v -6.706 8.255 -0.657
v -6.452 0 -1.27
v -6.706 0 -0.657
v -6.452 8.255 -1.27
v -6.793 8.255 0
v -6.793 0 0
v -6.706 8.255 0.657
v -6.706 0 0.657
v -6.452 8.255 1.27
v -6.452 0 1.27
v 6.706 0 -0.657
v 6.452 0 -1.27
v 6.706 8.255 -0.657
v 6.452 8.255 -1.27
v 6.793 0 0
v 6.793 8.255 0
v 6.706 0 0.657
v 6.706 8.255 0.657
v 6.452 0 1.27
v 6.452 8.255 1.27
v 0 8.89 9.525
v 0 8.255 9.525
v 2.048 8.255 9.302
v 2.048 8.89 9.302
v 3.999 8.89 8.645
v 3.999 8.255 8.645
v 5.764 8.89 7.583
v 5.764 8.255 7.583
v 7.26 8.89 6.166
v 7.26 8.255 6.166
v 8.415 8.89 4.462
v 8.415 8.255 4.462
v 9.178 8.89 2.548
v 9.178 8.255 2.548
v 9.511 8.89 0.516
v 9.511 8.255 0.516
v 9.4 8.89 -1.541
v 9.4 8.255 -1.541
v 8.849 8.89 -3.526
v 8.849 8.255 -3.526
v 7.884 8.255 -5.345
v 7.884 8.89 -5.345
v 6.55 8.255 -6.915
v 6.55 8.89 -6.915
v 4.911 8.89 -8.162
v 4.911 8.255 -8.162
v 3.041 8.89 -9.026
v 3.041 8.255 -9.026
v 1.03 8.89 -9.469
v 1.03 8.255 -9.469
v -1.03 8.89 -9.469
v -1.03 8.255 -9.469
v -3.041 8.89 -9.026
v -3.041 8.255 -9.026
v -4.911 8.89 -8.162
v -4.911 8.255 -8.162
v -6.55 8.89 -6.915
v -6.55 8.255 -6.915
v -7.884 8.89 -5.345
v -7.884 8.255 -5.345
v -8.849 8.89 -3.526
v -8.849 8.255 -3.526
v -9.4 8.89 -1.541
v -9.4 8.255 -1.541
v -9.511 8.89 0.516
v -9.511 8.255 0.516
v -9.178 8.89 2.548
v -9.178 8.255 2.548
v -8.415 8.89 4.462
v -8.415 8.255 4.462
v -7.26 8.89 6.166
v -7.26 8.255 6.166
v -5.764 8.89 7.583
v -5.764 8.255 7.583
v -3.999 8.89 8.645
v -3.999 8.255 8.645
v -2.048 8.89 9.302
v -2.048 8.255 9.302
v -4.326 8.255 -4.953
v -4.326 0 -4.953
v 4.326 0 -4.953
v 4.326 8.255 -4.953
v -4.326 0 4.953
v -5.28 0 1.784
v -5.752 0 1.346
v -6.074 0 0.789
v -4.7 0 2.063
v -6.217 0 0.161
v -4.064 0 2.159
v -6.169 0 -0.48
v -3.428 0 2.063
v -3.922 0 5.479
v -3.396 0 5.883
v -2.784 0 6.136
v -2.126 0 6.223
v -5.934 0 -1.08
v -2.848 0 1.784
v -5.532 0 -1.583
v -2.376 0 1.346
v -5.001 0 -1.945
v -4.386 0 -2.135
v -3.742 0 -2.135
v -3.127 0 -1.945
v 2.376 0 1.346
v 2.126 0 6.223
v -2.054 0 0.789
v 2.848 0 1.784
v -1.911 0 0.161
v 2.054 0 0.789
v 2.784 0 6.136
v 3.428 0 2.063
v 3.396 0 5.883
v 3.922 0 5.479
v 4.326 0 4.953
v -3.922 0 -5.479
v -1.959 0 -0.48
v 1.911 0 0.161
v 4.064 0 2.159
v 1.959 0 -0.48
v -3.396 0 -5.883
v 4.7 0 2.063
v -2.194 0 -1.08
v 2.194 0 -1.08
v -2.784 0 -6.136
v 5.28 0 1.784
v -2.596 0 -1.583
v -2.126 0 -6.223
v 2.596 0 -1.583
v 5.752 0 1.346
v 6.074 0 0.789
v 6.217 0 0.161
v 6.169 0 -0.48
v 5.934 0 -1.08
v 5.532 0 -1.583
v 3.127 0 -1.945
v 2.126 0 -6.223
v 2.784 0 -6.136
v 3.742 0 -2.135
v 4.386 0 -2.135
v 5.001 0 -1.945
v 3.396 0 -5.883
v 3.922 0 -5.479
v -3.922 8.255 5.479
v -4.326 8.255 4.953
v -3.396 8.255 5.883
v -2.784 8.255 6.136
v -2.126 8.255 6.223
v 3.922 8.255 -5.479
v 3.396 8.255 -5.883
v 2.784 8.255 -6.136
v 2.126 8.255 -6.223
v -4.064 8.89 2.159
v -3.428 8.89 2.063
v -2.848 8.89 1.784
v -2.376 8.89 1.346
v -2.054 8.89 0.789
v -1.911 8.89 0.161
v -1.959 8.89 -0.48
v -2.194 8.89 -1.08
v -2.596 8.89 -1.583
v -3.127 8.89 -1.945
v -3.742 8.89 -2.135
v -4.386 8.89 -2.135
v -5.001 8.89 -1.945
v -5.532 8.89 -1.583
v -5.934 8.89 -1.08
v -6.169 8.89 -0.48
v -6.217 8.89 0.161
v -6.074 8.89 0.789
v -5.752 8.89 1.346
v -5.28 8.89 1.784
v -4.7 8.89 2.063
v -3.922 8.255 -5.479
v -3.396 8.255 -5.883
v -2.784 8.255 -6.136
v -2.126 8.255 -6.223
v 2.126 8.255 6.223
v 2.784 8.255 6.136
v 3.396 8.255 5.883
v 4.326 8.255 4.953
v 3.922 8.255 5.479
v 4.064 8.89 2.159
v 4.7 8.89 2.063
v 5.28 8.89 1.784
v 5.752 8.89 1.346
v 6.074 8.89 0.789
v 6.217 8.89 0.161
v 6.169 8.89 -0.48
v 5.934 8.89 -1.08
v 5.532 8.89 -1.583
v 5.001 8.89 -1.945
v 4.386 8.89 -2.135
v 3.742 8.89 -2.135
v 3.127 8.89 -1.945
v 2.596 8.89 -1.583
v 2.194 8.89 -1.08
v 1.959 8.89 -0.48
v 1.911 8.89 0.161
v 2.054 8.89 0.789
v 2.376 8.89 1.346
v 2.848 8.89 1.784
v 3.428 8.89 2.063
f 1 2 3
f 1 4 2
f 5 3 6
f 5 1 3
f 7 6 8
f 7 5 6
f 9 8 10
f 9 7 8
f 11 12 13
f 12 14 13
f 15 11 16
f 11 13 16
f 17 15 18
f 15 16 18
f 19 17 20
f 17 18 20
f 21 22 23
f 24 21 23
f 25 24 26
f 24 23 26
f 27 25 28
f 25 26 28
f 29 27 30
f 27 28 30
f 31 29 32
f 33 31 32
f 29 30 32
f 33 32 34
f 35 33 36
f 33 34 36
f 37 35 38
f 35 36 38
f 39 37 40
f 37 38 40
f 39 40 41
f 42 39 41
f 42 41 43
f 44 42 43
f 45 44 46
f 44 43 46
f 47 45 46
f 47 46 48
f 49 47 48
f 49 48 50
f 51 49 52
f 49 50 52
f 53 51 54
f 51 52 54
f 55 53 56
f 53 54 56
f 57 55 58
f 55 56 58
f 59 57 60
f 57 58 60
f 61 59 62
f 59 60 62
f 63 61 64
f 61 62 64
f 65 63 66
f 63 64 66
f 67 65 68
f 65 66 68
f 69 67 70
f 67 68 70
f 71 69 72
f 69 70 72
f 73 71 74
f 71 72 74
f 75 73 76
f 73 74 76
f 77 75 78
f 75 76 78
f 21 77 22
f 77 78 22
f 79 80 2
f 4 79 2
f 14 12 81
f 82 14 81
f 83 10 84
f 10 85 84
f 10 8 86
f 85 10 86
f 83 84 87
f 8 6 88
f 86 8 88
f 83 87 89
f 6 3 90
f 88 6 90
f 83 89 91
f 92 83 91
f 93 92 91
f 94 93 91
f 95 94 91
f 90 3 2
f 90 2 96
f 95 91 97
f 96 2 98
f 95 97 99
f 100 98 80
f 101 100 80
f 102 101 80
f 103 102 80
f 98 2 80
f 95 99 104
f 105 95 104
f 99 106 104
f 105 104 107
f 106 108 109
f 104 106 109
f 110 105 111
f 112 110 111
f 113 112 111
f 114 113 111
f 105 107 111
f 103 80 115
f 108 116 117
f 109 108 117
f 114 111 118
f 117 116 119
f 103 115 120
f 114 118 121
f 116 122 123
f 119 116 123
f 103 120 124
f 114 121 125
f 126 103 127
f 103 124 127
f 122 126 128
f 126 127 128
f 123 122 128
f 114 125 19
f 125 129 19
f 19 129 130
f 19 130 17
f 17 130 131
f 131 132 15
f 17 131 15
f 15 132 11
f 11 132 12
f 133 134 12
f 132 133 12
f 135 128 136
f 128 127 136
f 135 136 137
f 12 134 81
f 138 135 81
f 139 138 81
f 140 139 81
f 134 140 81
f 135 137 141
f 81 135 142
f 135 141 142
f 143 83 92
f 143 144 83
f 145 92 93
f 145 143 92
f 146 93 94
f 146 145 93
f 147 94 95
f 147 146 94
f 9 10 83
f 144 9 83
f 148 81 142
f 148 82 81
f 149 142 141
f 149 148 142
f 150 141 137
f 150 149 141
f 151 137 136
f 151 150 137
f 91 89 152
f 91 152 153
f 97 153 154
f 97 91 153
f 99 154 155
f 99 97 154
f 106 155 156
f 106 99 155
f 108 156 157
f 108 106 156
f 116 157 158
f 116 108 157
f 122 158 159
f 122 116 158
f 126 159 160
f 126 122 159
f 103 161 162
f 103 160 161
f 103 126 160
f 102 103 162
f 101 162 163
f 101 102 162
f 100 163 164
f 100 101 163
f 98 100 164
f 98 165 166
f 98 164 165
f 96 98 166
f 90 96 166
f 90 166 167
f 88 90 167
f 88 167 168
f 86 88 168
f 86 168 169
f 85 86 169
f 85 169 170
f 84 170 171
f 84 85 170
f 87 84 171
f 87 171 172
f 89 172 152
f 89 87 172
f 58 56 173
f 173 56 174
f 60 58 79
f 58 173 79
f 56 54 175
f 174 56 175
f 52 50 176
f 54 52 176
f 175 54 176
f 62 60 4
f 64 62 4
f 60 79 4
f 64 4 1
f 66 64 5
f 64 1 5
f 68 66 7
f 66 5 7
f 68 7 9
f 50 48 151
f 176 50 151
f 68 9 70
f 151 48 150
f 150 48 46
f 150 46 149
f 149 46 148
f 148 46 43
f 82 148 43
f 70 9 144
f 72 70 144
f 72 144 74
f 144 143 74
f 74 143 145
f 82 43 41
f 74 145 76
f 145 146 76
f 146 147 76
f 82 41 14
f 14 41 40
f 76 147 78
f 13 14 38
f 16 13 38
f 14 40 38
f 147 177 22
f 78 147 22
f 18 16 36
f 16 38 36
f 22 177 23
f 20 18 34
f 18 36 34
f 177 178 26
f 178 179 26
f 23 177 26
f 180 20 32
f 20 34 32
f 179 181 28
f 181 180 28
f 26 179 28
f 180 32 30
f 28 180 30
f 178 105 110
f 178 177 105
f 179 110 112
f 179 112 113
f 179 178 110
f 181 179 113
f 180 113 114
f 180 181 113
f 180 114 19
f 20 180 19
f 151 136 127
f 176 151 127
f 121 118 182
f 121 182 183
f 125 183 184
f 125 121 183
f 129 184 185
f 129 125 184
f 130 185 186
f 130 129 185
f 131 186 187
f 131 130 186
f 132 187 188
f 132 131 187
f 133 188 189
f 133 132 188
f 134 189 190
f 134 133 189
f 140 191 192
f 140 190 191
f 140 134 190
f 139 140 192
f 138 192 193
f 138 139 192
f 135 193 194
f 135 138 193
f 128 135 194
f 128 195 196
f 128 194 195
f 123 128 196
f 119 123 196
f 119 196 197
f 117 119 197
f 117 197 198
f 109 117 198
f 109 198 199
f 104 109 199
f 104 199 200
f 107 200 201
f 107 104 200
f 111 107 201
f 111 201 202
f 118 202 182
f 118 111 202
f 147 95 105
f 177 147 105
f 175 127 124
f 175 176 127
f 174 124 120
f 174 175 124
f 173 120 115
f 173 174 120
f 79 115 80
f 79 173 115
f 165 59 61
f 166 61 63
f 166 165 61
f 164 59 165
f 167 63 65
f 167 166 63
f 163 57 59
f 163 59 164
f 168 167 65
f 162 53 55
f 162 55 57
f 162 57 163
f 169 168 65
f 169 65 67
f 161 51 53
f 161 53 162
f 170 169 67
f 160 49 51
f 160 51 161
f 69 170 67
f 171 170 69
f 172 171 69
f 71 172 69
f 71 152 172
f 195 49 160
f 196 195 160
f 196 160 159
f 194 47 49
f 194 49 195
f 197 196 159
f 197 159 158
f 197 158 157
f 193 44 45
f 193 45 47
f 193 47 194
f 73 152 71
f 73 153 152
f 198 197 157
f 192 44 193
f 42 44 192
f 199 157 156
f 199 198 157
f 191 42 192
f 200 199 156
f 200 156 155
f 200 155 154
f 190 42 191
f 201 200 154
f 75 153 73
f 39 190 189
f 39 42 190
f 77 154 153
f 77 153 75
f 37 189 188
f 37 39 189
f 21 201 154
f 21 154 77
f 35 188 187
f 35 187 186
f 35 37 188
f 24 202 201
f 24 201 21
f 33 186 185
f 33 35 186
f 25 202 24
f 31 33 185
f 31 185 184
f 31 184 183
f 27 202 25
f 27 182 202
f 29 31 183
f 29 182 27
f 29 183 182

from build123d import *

# Parameters (mm, degrees)
BOSS_EXTRUDE1_DEPTH     = 8.255
SKETCH2_R               = 9.525
BOSS_EXTRUDE2_DEPTH     = 0.635
CUT_EXTRUDE1_DEPTH      = 17.139496584
CUT_EXTRUDE1_DEPTH_BACK = 17.139496584
SKETCH3_R               = 2.159
FILLET1_R               = 2.54


with BuildPart() as part:
    # Sketch1 → Boss-Extrude1 (new body)
    with BuildSketch(Plane(origin=(0, 0, 0), x_dir=(1, 0, 0), z_dir=(0, 1, 0))):
        Polygon((7.18570145, 0), (3.592850725, 6.223), (-3.592850725, 6.223), (-7.18570145, 0), (-3.592850725, -6.223), (3.592850725, -6.223), align=None)
    extrude(amount=BOSS_EXTRUDE1_DEPTH)

    # Sketch2 → Boss-Extrude2 (add)
    with BuildSketch(Plane(origin=(0, 8.255, 0), x_dir=(1, 0, 0), z_dir=(0, 1, 0))):
        with Locations(Location((0, 0, 0), (0, 0, 270))):
            Circle(SKETCH2_R)
    extrude(amount=BOSS_EXTRUDE2_DEPTH)

    # Sketch3 → Cut-Extrude1 (cut, two sides: drawn at the far end of the back side and taken through both)
    with BuildSketch(Plane(origin=(0, 8.89, 0), x_dir=(1, 0, 0), z_dir=(0, 1, 0)).offset(-CUT_EXTRUDE1_DEPTH_BACK)):
        with Locations(Location((-4.064, 0, 0), (0, 0, 270))):
            Circle(SKETCH3_R)
        with Locations(Location((4.064, 0, 0), (0, 0, 270))):
            Circle(SKETCH3_R)
    extrude(amount=CUT_EXTRUDE1_DEPTH + CUT_EXTRUDE1_DEPTH_BACK, mode=Mode.SUBTRACT)

    # Fillet1
    fillet1_edges = [part.edges().sort_by_distance(p)[0] for p in [
        (3.592850725, 4.1275, 6.223),
        (-3.592850725, 4.1275, 6.223),
        (-7.18570145, 4.1275, 0),
        (-3.592850725, 4.1275, -6.223),
        (3.592850725, 4.1275, -6.223),
        (7.18570145, 4.1275, 0),
    ]]
    fillet(fillet1_edges, radius=FILLET1_R)


solid = part.part
